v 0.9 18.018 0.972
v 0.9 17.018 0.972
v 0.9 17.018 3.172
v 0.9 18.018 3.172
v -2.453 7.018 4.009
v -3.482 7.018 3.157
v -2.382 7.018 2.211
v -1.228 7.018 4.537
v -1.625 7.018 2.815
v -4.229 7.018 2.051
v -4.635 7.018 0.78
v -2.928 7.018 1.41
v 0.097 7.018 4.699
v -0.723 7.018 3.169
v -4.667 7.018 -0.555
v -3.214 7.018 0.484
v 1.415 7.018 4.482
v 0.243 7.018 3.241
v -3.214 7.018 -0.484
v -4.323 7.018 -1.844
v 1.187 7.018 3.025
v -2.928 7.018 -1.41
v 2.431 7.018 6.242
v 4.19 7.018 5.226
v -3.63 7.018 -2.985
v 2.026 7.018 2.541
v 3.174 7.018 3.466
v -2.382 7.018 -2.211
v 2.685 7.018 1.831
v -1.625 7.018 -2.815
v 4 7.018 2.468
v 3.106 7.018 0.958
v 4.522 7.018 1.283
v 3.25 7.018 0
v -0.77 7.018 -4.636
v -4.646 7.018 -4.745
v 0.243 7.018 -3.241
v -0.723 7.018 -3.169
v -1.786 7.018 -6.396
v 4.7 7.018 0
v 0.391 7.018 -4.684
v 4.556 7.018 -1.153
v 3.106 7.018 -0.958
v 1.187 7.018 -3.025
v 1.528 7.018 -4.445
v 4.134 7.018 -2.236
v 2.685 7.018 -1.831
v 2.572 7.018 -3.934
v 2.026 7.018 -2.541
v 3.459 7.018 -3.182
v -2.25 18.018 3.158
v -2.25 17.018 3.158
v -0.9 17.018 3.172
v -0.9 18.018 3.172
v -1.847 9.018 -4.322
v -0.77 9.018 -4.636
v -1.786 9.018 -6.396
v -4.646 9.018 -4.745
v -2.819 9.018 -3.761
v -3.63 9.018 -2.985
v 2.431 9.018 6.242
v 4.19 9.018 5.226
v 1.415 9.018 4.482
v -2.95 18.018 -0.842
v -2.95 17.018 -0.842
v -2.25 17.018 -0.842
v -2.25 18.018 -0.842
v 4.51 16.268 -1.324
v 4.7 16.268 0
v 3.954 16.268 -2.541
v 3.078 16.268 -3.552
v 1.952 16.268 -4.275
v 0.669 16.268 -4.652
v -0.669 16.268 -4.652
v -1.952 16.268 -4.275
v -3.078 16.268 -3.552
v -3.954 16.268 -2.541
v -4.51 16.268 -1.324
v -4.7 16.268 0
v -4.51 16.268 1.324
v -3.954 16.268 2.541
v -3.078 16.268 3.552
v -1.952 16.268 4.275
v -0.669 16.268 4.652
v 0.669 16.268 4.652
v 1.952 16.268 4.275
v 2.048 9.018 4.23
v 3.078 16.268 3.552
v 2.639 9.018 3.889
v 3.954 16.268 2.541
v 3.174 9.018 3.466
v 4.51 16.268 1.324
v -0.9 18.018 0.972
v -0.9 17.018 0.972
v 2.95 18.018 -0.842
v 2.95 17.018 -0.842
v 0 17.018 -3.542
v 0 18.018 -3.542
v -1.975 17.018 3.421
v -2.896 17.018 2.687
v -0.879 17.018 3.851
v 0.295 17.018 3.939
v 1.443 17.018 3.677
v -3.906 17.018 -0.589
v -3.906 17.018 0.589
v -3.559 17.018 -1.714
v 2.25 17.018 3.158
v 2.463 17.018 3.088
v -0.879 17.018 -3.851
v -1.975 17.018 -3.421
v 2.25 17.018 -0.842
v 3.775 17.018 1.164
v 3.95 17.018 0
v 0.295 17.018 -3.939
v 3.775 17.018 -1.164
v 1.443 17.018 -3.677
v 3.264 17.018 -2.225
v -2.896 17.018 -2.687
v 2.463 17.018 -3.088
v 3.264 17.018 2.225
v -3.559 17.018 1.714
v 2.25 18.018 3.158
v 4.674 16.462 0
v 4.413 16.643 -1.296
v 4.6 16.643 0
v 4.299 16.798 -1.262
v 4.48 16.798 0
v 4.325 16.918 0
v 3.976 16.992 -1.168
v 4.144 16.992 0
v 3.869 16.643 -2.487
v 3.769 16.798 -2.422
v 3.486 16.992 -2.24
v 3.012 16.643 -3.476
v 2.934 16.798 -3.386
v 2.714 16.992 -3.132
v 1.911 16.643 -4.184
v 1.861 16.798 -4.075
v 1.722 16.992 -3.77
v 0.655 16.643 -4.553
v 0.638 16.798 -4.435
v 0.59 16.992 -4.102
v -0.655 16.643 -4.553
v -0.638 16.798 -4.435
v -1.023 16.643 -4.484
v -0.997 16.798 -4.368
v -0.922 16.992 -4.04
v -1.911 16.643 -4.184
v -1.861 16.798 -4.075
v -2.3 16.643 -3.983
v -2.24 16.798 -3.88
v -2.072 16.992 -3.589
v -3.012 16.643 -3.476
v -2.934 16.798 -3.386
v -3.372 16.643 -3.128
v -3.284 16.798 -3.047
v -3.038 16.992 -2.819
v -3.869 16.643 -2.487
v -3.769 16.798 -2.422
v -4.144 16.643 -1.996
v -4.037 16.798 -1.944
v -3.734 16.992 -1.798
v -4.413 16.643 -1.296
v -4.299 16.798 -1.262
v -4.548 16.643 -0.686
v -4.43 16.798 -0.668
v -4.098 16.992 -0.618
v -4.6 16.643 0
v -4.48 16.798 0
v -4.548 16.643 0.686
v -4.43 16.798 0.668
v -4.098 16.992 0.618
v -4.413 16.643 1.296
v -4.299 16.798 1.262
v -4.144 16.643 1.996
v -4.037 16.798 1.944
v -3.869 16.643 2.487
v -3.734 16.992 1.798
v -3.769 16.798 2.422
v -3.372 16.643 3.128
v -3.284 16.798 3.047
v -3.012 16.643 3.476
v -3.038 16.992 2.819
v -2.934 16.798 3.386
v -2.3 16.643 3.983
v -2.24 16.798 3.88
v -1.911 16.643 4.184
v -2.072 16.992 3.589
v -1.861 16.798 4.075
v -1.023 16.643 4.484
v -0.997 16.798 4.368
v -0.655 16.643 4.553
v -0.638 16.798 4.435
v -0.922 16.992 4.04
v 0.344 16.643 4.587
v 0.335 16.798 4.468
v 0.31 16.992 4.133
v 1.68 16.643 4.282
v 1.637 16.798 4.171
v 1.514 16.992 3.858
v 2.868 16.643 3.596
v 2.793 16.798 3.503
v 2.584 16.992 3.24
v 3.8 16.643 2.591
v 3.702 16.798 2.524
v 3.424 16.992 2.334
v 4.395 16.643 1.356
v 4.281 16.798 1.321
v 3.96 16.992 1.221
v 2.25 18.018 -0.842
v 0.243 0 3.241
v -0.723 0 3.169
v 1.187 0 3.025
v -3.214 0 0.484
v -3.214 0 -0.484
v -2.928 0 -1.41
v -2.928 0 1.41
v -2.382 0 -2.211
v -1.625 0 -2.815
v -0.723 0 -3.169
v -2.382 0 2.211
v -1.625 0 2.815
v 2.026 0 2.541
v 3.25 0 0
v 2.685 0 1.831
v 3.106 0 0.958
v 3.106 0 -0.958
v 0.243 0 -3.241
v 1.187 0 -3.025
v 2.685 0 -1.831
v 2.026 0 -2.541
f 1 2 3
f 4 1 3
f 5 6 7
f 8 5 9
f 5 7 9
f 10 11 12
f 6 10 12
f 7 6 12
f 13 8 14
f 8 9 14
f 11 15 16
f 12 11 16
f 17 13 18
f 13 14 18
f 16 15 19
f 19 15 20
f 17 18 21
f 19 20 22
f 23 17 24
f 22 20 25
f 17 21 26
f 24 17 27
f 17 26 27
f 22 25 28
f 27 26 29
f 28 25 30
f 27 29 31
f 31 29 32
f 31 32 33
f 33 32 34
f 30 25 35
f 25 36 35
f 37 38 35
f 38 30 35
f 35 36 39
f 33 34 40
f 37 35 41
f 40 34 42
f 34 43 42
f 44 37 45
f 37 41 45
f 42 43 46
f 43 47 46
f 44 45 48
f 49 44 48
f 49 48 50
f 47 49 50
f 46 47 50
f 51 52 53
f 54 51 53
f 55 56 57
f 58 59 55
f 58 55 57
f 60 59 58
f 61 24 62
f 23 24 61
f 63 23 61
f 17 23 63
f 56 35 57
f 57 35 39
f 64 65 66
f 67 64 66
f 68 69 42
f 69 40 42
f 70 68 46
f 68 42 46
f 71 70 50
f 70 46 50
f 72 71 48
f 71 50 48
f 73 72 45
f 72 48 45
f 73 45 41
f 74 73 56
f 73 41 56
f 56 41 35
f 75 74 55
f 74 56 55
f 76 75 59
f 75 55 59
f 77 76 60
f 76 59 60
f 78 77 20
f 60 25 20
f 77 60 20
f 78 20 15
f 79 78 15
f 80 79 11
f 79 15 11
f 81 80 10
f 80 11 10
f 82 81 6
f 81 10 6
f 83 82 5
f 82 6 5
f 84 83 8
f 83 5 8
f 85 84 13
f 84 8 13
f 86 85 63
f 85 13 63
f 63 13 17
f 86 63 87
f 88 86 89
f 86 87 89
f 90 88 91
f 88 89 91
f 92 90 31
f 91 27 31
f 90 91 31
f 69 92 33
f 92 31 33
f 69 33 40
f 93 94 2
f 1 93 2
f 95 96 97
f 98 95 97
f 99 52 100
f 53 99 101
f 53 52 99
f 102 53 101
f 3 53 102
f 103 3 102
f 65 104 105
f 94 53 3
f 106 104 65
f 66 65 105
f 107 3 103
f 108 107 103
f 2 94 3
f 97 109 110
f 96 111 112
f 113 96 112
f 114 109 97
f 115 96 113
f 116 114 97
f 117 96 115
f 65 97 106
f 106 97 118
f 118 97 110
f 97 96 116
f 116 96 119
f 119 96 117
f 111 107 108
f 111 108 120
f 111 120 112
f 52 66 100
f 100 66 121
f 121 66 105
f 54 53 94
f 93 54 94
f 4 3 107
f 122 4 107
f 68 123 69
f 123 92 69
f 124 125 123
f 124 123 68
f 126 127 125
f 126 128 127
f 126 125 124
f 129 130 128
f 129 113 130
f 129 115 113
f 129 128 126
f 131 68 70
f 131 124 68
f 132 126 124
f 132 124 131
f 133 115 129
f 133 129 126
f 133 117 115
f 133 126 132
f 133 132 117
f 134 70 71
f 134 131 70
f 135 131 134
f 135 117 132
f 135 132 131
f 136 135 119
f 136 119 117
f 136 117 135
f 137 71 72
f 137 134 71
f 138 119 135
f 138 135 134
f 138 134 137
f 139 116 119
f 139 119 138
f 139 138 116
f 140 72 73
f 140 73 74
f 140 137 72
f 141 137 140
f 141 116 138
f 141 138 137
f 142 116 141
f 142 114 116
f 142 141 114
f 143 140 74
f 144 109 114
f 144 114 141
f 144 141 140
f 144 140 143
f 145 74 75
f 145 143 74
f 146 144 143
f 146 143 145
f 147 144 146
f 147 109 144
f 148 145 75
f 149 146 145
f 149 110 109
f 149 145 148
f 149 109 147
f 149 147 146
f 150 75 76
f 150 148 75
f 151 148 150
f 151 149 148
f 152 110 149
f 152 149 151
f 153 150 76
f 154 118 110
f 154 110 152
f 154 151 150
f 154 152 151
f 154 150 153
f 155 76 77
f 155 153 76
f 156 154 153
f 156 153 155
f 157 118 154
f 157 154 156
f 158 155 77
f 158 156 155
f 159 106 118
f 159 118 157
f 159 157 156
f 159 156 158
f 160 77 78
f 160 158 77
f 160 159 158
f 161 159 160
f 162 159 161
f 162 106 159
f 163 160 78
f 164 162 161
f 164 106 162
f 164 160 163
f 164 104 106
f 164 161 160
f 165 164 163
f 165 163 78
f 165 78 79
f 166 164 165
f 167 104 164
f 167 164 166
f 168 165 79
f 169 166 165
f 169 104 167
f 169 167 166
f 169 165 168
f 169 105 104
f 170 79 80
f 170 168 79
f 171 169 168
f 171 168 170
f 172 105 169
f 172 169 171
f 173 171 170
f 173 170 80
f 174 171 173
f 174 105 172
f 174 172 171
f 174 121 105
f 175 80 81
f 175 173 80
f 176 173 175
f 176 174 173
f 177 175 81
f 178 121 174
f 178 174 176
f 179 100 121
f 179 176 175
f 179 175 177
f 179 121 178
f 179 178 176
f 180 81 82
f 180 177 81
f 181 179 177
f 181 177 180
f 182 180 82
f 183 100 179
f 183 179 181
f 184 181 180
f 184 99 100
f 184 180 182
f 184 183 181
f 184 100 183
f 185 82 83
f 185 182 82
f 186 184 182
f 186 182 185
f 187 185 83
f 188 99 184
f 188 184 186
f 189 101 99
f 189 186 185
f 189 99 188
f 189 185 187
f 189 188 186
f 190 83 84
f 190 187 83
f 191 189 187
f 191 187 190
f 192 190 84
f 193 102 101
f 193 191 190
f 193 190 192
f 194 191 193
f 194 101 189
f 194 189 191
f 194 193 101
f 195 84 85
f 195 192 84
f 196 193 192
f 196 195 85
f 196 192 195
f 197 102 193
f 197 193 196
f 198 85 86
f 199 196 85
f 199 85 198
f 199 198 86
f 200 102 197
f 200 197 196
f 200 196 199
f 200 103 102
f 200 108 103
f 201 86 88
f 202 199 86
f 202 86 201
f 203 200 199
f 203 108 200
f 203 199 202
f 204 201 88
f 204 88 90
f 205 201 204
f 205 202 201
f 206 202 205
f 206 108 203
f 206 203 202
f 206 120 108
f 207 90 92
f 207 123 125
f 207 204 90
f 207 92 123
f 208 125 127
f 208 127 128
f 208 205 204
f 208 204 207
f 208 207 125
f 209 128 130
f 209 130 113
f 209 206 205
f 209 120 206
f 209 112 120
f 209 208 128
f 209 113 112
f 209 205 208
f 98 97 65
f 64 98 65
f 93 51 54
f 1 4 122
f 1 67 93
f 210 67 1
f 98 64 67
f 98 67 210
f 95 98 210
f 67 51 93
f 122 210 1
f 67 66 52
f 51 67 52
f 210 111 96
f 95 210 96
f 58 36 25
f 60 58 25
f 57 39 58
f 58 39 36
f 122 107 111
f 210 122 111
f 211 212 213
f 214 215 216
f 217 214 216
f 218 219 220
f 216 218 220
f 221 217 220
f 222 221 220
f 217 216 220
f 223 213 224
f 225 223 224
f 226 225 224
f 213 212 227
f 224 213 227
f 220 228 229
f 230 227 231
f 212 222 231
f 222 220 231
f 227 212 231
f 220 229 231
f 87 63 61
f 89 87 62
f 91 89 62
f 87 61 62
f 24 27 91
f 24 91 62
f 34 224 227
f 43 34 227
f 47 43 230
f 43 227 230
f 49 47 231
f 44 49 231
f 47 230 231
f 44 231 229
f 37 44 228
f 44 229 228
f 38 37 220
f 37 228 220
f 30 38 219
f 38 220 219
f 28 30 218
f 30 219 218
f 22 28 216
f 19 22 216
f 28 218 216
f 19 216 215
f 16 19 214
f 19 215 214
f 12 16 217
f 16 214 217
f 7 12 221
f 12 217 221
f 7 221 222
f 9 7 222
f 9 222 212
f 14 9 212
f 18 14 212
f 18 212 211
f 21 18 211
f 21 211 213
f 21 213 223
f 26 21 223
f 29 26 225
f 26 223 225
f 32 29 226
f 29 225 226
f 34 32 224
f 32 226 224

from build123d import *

# Parameters (mm, degrees)
SKETCH1_R           = 3.25
BOSS_EXTRUDE1_DEPTH = 7.018
SKETCH6_R           = 4.7
BOSS_EXTRUDE2_DEPTH = 10
BOSS_EXTRUDE3_DEPTH = 1
FILLET1_R           = 0.75
BOSS_EXTRUDE4_DEPTH = 2


with BuildPart() as part:
    # Sketch1 → Boss-Extrude1 (new body)
    with BuildSketch(Plane(origin=(0, 0, 0), x_dir=(1, 0, 0), z_dir=(0, 1, 0))):
        Circle(SKETCH1_R)
    extrude(amount=BOSS_EXTRUDE1_DEPTH)

    # Sketch6 → Boss-Extrude2 (add)
    with BuildSketch(Plane(origin=(0, 7.018, 0), x_dir=(1, 0, 0), z_dir=(0, 1, 0))):
        Circle(SKETCH6_R)
    extrude(amount=BOSS_EXTRUDE2_DEPTH)

    # Sketch12 → Boss-Extrude3 (add)
    with BuildSketch(Plane(origin=(0, 17.018, 0), x_dir=(1, 0, 0), z_dir=(0, 1, 0))):
        Polygon((0, 3.542487974), (-2.95, 0.842487974), (-2.25, 0.842487974), (-2.25, -3.157512026), (-0.9, -3.172366953), (-0.9, -0.972366953), (0.9, -0.972366953), (0.9, -3.172366953), (2.25, -3.157512026), (2.25, 0.842487974), (2.95, 0.842487974), align=None)
    extrude(amount=BOSS_EXTRUDE3_DEPTH)

    # Fillet1
    fillet1_edges = [part.edges().sort_by_distance(p)[0] for p in [
        (-4.7, 17.018, 0),
    ]]
    fillet(fillet1_edges, radius=FILLET1_R)

    # Sketch13 → Boss-Extrude4 (add)
    with BuildSketch(Plane.XZ.offset(-7.018)):
        with BuildLine():
            Line((-0.770430625, -4.636424986), (-1.786430625, -6.396188607))
            Line((-1.786430625, -6.396188607), (-4.646046508, -4.745188607))
            Line((-4.646046508, -4.745188607), (-3.630046508, -2.985424986))
            ThreePointArc((-3.630046508, -2.985424986), (-2.35, -4.070319398), (-0.770430625, -4.636424986))
        make_face()
        with BuildLine():
            Line((3.174317689, 3.466079516), (4.190317689, 5.225843137))
            Line((4.190317689, 5.225843137), (2.430554068, 6.241843137))
            Line((2.430554068, 6.241843137), (1.414554068, 4.482079516))
            ThreePointArc((1.414554068, 4.482079516), (2.35, 4.070319398), (3.174317689, 3.466079516))
        make_face()
    extrude(amount=-BOSS_EXTRUDE4_DEPTH)


solid = part.part
